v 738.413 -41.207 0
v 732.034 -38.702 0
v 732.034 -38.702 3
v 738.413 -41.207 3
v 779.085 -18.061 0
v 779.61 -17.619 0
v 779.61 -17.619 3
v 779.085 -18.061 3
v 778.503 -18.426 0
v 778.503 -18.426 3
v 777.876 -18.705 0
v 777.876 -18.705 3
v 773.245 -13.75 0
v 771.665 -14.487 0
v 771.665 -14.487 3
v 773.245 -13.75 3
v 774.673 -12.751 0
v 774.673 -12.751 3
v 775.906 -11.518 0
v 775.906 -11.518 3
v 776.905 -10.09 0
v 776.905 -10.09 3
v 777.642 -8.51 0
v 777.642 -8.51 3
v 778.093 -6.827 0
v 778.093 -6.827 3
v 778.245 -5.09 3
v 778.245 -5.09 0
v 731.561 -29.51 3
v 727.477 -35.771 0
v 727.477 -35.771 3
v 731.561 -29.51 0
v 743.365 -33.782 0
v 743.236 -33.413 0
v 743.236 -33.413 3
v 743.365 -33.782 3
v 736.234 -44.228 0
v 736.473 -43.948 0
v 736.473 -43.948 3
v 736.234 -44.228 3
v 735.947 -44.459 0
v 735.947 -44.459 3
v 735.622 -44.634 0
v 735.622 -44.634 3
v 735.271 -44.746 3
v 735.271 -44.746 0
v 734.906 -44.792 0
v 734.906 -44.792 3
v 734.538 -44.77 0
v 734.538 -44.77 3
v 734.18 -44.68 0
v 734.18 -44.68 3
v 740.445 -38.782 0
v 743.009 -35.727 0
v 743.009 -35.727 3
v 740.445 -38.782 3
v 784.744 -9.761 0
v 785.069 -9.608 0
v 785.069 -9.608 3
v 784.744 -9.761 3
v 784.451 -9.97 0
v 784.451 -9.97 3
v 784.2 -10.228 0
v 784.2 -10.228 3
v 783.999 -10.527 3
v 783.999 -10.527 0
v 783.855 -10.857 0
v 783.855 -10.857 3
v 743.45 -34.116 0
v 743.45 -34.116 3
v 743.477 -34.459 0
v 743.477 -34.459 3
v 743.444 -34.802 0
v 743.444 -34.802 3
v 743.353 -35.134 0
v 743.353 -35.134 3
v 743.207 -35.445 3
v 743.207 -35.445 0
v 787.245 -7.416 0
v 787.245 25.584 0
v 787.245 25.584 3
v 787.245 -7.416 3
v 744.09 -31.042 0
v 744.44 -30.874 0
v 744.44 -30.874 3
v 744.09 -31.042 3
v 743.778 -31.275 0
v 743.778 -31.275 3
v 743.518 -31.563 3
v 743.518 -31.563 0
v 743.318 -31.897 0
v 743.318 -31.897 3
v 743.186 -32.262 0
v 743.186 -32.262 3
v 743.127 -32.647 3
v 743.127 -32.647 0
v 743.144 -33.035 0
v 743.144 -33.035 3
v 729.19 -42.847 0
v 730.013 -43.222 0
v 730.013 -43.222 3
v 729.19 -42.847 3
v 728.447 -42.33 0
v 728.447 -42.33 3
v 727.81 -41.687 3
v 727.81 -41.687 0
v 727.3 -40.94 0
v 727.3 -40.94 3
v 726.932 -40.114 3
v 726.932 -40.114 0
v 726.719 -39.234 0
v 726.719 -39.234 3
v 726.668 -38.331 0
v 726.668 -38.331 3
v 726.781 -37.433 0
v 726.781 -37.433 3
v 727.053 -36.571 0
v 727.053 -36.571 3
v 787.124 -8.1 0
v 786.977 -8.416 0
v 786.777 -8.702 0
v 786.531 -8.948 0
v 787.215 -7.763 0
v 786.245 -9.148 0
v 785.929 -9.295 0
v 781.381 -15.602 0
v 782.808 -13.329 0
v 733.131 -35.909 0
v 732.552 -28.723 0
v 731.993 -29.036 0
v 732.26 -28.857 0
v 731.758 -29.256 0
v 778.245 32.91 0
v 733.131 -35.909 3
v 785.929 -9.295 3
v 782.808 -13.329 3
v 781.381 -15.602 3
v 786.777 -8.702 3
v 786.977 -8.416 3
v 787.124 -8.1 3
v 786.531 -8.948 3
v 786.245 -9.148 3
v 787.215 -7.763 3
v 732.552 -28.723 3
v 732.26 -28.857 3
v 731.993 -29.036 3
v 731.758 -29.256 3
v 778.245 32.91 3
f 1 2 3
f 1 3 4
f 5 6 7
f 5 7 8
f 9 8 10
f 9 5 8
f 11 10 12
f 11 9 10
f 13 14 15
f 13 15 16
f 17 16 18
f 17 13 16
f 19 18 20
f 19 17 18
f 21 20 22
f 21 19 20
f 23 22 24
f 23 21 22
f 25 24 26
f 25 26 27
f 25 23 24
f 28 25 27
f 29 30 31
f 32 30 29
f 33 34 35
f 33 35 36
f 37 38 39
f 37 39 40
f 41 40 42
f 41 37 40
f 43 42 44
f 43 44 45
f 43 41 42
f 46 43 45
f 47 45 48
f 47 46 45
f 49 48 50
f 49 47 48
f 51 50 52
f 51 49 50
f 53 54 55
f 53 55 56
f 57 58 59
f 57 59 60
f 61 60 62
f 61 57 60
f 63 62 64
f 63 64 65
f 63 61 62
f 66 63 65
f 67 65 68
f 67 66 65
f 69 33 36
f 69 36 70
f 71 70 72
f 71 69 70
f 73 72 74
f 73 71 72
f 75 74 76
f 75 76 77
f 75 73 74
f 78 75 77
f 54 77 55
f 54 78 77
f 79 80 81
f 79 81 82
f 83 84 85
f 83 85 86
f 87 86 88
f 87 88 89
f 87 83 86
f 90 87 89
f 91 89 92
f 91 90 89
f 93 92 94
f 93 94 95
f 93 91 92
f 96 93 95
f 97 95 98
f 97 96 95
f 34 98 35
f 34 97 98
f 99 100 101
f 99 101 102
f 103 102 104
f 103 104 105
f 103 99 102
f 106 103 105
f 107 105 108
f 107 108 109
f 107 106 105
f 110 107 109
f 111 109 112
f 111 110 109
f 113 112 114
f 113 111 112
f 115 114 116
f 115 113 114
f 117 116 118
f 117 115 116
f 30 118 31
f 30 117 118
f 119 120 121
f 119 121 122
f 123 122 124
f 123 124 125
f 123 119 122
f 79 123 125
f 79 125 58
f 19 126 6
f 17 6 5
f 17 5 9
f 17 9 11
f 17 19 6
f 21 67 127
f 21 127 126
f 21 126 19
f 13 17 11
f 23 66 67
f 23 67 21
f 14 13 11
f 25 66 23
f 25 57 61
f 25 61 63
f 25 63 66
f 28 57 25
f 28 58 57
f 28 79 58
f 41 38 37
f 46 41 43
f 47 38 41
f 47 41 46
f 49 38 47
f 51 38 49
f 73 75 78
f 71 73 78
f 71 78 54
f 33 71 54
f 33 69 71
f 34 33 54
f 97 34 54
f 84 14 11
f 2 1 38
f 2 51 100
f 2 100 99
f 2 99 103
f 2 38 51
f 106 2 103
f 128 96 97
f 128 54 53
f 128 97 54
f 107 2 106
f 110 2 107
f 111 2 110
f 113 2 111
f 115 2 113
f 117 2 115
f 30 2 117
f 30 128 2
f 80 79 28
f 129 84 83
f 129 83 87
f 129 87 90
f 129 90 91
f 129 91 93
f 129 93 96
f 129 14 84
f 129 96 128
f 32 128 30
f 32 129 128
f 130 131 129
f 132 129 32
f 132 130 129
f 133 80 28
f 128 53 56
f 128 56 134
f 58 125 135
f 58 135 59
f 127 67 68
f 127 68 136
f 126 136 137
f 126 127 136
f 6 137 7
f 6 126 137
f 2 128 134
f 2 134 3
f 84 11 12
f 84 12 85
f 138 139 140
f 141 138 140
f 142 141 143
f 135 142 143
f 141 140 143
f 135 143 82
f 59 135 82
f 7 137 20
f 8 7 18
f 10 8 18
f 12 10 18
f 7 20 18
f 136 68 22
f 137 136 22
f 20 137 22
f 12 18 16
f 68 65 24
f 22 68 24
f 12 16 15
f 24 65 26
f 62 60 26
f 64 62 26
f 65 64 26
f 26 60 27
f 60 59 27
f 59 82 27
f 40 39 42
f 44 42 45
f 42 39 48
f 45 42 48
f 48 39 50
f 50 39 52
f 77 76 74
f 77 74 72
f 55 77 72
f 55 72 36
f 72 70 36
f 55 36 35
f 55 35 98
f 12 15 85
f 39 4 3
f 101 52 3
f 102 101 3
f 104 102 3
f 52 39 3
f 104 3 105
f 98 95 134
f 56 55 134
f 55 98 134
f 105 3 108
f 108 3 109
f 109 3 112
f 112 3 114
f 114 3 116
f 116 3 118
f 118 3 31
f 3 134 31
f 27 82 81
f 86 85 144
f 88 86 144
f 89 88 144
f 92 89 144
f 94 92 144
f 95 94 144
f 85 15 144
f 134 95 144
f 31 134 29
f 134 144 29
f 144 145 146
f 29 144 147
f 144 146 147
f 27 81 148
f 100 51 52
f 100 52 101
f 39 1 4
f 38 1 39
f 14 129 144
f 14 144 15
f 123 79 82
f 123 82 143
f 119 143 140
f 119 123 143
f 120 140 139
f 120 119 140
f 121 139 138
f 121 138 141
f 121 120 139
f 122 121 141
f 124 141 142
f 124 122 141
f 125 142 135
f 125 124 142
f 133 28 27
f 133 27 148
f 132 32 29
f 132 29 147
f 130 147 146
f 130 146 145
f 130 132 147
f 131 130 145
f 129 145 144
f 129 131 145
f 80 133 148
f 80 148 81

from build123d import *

# Parameters (mm, degrees)
BASE_EXTRUDE_DEPTH = 3


with BuildPart() as part:
    # Sketch1 → Base-Extrude (new body)
    with BuildSketch(Plane.XY):
        with BuildLine():
            Line((732.034300263, -38.701536799), (738.412696802, -41.20669573))
            Line((738.412696802, -41.20669573), (736.473436897, -43.947731787))
            ThreePointArc((736.473436897, -43.947731787), (735.449310633, -44.697774319), (734.180021911, -44.680323155))
            Line((734.180021911, -44.680323155), (730.013302653, -43.221928834))
            ThreePointArc((730.013302653, -43.221928834), (726.93179591, -40.113817439), (727.477141983, -35.771164112))
            Line((727.477141983, -35.771164112), (731.560851868, -29.509962721))
            ThreePointArc((731.560851868, -29.509962721), (731.992554194, -29.036110484), (732.551993885, -28.723172671))
            Line((732.551993885, -28.723172671), (771.665266629, -14.487105627))
            ThreePointArc((771.665266629, -14.487105627), (776.436585639, -10.825943783), (778.245065196, -5.090179419))
            Line((778.245065196, -5.090179419), (778.245065196, 32.909820581))
            Line((778.245065196, 32.909820581), (787.245065196, 25.583892383))
            Line((787.245065196, 25.583892383), (787.245065196, -7.416107617))
            ThreePointArc((787.245065196, -7.416107617), (786.883369284, -8.563260489), (785.929105482, -9.295492858))
            Line((785.929105482, -9.295492858), (785.06938995, -9.608403722))
            ThreePointArc((785.06938995, -9.608403722), (784.319331429, -10.093744269), (783.855426973, -10.857246649))
            ThreePointArc((783.855426973, -10.857246649), (782.140163623, -14.493920417), (779.609772484, -17.618763634))
            ThreePointArc((779.609772484, -17.618763634), (778.800038242, -18.253560622), (777.875517606, -18.705111674))
            Line((777.875517606, -18.705111674), (744.440455722, -30.874478981))
            ThreePointArc((744.440455722, -30.874478981), (743.317578976, -31.896513164), (743.236121599, -33.412682929))
            Line((743.236121599, -33.412682929), (743.365082604, -33.782324318))
            ThreePointArc((743.365082604, -33.782324318), (743.443954805, -34.801616013), (743.008797081, -35.726718244))
            Line((743.008797081, -35.726718244), (740.445206883, -38.781886072))
            Line((740.445206883, -38.781886072), (733.131014766, -35.909187018))
            Line((733.131014766, -35.909187018), (732.034300263, -38.701536799))
        make_face()
    extrude(amount=BASE_EXTRUDE_DEPTH)


solid = part.part
